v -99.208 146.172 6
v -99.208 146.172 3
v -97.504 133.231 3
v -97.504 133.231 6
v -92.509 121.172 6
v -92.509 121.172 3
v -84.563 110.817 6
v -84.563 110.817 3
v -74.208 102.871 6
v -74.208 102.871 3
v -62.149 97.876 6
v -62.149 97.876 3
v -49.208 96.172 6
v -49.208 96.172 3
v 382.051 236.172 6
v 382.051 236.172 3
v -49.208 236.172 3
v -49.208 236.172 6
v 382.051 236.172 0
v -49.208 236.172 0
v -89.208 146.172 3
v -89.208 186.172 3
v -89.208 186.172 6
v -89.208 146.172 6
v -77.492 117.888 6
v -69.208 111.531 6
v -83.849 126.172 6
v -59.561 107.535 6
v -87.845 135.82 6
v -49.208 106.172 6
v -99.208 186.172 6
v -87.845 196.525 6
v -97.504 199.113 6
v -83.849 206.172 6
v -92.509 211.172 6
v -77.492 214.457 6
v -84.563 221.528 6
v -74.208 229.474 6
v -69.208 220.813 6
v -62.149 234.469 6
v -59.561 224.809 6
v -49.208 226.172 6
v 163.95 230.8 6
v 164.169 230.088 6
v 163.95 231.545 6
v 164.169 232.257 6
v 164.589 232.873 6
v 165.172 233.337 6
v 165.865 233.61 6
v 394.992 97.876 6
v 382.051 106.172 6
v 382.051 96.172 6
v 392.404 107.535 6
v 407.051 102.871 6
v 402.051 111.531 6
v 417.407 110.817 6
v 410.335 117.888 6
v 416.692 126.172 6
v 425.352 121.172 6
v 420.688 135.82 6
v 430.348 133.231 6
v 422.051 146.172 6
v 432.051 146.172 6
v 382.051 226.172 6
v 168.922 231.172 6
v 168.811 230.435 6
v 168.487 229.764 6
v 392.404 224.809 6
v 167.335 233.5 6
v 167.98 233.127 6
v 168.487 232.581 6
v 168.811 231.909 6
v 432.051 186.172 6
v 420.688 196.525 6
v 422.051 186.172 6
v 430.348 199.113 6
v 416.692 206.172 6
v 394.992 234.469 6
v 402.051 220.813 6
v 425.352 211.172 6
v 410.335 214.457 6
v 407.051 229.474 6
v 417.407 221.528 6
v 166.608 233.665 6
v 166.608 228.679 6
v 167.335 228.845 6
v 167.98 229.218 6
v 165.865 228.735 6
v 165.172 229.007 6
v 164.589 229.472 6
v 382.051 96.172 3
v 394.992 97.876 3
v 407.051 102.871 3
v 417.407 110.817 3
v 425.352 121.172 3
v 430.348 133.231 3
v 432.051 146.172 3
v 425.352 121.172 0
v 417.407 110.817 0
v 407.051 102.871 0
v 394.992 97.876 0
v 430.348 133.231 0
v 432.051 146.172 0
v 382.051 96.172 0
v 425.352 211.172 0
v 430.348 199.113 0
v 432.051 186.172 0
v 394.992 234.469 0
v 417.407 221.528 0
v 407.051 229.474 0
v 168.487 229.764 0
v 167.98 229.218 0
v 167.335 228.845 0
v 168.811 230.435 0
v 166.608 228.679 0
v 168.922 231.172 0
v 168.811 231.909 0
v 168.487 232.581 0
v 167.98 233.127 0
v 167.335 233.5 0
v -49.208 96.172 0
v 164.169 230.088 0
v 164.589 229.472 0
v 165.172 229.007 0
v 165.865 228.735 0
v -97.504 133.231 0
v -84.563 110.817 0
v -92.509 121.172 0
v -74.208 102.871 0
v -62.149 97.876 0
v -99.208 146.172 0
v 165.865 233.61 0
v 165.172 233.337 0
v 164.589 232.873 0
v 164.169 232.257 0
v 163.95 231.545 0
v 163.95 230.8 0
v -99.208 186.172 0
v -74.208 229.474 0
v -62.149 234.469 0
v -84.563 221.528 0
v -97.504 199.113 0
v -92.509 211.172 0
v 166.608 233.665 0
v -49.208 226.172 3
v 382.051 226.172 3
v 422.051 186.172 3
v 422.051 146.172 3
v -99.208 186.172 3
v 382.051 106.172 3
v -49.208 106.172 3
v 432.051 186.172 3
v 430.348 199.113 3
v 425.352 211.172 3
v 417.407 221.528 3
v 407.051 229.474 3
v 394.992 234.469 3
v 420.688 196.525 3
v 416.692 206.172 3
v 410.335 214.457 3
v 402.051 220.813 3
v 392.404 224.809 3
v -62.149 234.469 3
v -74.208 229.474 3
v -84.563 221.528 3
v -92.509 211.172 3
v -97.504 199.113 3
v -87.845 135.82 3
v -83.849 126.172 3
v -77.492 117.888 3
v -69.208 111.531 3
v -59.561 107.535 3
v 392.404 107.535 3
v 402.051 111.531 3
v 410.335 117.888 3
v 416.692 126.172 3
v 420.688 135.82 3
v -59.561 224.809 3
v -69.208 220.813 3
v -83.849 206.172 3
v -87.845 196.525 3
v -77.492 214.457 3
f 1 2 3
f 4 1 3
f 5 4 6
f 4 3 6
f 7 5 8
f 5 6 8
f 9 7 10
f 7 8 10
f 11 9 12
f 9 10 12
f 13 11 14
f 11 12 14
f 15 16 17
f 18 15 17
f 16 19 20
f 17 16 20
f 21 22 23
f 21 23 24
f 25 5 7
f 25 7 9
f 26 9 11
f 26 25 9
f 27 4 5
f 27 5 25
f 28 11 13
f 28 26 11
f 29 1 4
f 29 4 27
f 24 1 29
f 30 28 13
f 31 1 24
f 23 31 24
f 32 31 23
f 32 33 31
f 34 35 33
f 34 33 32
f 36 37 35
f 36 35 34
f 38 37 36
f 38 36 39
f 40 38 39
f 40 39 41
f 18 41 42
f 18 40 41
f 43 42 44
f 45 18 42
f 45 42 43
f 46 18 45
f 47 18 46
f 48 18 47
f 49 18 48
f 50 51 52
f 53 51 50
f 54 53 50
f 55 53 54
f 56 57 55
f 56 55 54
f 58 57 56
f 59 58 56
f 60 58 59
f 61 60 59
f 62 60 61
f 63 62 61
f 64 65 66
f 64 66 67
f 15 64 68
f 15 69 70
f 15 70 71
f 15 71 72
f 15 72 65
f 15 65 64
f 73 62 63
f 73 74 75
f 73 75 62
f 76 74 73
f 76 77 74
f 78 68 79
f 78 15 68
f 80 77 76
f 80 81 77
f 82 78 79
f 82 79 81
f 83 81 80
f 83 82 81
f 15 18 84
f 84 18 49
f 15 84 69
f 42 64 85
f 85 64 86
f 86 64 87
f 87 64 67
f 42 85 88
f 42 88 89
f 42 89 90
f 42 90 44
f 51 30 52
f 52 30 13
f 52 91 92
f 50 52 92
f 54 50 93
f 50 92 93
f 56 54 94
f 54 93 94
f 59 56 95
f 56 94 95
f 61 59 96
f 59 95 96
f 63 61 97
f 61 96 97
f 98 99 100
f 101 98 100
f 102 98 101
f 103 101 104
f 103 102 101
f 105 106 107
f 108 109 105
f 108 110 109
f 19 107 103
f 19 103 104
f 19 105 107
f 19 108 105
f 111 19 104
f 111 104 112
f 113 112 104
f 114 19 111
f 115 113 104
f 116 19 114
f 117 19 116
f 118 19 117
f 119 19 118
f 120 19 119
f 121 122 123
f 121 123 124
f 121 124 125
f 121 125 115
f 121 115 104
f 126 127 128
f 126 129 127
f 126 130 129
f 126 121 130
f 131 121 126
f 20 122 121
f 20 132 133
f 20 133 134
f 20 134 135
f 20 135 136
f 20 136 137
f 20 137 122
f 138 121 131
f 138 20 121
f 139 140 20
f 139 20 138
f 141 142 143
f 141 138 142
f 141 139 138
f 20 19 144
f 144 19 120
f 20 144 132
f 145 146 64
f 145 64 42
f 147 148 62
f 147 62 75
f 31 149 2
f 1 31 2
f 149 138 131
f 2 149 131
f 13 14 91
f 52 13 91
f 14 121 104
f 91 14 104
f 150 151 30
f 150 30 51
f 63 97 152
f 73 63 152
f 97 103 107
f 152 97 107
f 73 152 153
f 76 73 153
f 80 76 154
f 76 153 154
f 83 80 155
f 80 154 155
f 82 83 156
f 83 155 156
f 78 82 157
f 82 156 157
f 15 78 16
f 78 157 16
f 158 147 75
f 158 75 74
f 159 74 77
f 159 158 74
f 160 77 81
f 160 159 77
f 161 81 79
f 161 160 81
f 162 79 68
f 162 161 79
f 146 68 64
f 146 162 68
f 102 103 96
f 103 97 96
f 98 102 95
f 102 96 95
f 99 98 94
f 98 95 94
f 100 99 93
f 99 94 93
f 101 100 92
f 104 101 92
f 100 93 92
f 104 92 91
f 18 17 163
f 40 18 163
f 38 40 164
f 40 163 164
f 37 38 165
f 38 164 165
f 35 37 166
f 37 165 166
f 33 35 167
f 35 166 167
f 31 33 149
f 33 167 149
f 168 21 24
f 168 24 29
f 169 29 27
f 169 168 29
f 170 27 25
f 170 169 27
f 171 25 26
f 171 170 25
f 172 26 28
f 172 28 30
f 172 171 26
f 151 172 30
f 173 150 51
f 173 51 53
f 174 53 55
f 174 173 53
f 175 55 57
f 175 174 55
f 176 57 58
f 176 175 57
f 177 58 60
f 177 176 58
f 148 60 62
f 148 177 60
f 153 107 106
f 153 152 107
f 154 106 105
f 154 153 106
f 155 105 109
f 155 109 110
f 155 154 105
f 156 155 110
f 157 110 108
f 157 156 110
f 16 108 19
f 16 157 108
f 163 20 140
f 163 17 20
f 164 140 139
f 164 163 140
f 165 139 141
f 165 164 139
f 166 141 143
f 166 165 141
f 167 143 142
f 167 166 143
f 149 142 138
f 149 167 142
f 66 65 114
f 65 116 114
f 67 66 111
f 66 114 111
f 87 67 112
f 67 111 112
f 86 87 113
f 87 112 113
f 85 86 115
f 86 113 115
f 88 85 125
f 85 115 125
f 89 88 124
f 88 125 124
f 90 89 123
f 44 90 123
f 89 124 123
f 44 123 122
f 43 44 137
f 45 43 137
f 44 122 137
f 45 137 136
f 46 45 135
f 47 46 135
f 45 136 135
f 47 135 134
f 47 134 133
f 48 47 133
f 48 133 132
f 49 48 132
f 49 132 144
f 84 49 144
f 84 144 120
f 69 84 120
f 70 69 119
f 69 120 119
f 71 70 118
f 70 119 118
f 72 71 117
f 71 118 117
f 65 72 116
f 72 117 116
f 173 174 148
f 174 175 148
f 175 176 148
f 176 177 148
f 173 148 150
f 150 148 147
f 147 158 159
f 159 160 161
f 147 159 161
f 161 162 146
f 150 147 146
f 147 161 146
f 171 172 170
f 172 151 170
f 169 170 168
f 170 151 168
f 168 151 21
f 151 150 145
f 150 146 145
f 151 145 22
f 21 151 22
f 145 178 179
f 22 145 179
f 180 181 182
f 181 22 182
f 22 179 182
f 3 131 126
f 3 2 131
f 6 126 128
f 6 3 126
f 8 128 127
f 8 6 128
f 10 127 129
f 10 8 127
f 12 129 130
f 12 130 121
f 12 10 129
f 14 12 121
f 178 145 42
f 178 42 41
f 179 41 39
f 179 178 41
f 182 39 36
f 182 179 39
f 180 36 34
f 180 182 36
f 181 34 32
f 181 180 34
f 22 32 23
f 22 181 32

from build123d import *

# Parameters (mm, degrees)
AUFSATZ_LINEAR_AUSTRAGEN1_DEPTH = 3
SKIZZE2_W                       = 52.543234094
SKIZZE2_H                       = 140
SKIZZE2_W_2                     = 111.276179835
AUFSATZ_LINEAR_AUSTRAGEN2_DEPTH = 3
VERRUNDUNG1_R                   = 50
VERRUNDUNG2_R                   = 50
SKIZZE3_R                       = 2.5
SCHNITT_LINEAR_AUSTRAGEN1_DEPTH = 10
AUFSATZ_LINEAR_AUSTRAGEN3_DEPTH = 3
SKIZZE6_R                       = 2.5
SCHNITT_LINEAR_AUSTRAGEN2_DEPTH = 7


with BuildPart() as part:
    # Skizze1 → Aufsatz-Linear austragen1 (new body)
    with BuildSketch(Plane.XY):
        Polygon((432.051221513, 126.172344807), (432.051221513, 206.172344807), (431.494421695, 212.025054468), (429.845419749, 217.652847778), (427.167585893, 222.839451798), (423.563827781, 227.385548243), (419.172635816, 231.116433176), (414.162761042, 233.888730783), (408.726730139, 235.595903219), (403.073446724, 236.172344807), (-70.230208158, 236.172344807), (-75.883491573, 235.595903219), (-81.319522476, 233.888730783), (-86.32939725, 231.116433176), (-90.720589215, 227.385548243), (-94.324347327, 222.839451798), (-97.002181183, 217.652847778), (-98.651183129, 212.025054468), (-99.207982946, 206.172344807), (-99.207982946, 126.172344807), (-98.651183129, 120.319635147), (-97.002181183, 114.691841836), (-94.324347327, 109.505237817), (-90.720589215, 104.959141372), (-86.32939725, 101.228256438), (-81.319522476, 98.455958832), (-75.883491573, 96.748786395), (-70.230208158, 96.172344807), (403.073446724, 96.172344807), (408.726730139, 96.748786395), (414.162761042, 98.455958832), (419.172635816, 101.228256438), (423.563827781, 104.959141372), (427.167585893, 109.505237817), (429.845419749, 114.691841836), (431.494421695, 120.319635147), align=None)
    extrude(amount=AUFSATZ_LINEAR_AUSTRAGEN1_DEPTH)

    # Skizze2 → Aufsatz-Linear austragen2 (add)
    with BuildSketch(Plane(origin=(0, 0, 0), x_dir=(-1, 0, 0), z_dir=(0, 0, -1))):
        with Locations((-405.779604466, 166.172344807)):
            Rectangle(SKIZZE2_W, SKIZZE2_H)
        with Locations((43.569893028, 166.172344807)):
            Rectangle(SKIZZE2_W_2, SKIZZE2_H)
    extrude(amount=-AUFSATZ_LINEAR_AUSTRAGEN2_DEPTH)

    # Verrundung1
    verrundung1_edges = [part.edges().sort_by_distance(p)[0] for p in [
        (432.051221513, 96.172344807, 1.5),
        (-99.207982946, 236.172344807, 1.5),
        (-99.207982946, 96.172344807, 1.5),
    ]]
    fillet(verrundung1_edges, radius=VERRUNDUNG1_R)

    # Verrundung2
    verrundung2_edges = [part.edges().sort_by_distance(p)[0] for p in [
        (432.051221513, 236.172344807, 1.5),
    ]]
    fillet(verrundung2_edges, radius=VERRUNDUNG2_R)

    # Skizze3 → Schnitt-Linear austragen1 (cut)
    with BuildSketch(Plane.XY.offset(3)):
        with Locations((166.421619283, 231.172344807)):
            Circle(SKIZZE3_R)
    extrude(amount=-SCHNITT_LINEAR_AUSTRAGEN1_DEPTH, mode=Mode.SUBTRACT)

    # Skizze5 → Aufsatz-Linear austragen3 (add)
    with BuildSketch(Plane.XY.offset(3)):
        with BuildLine():
            Line((432.051221513, 146.172344807), (432.051221513, 186.172344807))
            ThreePointArc((432.051221513, 186.172344807), (417.406560572, 221.527683867), (382.051221513, 236.172344807))
            Line((382.051221513, 236.172344807), (-49.207982946, 236.172344807))
            ThreePointArc((-49.207982946, 236.172344807), (-84.563322006, 221.527683867), (-99.207982946, 186.172344807))
            Line((-99.207982946, 186.172344807), (-99.207982946, 146.172344807))
            ThreePointArc((-99.207982946, 146.172344807), (-84.563322006, 110.817005748), (-49.207982946, 96.172344807))
            Line((-49.207982946, 96.172344807), (382.051221513, 96.172344807))
            ThreePointArc((382.051221513, 96.172344807), (417.406560572, 110.817005748), (432.051221513, 146.172344807))
        make_face()
        with BuildLine():
            Line((-89.207982946, 186.172344807), (-89.207982946, 146.172344807))
            ThreePointArc((-89.207982946, 146.172344807), (-77.492254194, 117.88807356), (-49.207982946, 106.172344807))
            Line((-49.207982946, 106.172344807), (382.051221513, 106.172344807))
            ThreePointArc((382.051221513, 106.172344807), (410.33549276, 117.88807356), (422.051221513, 146.172344807))
            Line((422.051221513, 146.172344807), (422.051221513, 186.172344807))
            ThreePointArc((422.051221513, 186.172344807), (410.33549276, 214.456616055), (382.051221513, 226.172344807))
            Line((382.051221513, 226.172344807), (-49.207982946, 226.172344807))
            ThreePointArc((-49.207982946, 226.172344807), (-77.492254194, 214.456616055), (-89.207982946, 186.172344807))
        make_face(mode=Mode.SUBTRACT)
    extrude(amount=AUFSATZ_LINEAR_AUSTRAGEN3_DEPTH)

    # Skizze6 → Schnitt-Linear austragen2 (cut, through all)
    with BuildSketch(Plane(origin=(0, 0, 0), x_dir=(-1, 0, 0), z_dir=(0, 0, -1))):
        with Locations(Location((-166.421619283, 231.172344807, 0), (0, 0, 180))):  # turned: the seam where the file's is
            Circle(SKIZZE6_R)
    extrude(amount=-SCHNITT_LINEAR_AUSTRAGEN2_DEPTH, mode=Mode.SUBTRACT)


solid = part.part
